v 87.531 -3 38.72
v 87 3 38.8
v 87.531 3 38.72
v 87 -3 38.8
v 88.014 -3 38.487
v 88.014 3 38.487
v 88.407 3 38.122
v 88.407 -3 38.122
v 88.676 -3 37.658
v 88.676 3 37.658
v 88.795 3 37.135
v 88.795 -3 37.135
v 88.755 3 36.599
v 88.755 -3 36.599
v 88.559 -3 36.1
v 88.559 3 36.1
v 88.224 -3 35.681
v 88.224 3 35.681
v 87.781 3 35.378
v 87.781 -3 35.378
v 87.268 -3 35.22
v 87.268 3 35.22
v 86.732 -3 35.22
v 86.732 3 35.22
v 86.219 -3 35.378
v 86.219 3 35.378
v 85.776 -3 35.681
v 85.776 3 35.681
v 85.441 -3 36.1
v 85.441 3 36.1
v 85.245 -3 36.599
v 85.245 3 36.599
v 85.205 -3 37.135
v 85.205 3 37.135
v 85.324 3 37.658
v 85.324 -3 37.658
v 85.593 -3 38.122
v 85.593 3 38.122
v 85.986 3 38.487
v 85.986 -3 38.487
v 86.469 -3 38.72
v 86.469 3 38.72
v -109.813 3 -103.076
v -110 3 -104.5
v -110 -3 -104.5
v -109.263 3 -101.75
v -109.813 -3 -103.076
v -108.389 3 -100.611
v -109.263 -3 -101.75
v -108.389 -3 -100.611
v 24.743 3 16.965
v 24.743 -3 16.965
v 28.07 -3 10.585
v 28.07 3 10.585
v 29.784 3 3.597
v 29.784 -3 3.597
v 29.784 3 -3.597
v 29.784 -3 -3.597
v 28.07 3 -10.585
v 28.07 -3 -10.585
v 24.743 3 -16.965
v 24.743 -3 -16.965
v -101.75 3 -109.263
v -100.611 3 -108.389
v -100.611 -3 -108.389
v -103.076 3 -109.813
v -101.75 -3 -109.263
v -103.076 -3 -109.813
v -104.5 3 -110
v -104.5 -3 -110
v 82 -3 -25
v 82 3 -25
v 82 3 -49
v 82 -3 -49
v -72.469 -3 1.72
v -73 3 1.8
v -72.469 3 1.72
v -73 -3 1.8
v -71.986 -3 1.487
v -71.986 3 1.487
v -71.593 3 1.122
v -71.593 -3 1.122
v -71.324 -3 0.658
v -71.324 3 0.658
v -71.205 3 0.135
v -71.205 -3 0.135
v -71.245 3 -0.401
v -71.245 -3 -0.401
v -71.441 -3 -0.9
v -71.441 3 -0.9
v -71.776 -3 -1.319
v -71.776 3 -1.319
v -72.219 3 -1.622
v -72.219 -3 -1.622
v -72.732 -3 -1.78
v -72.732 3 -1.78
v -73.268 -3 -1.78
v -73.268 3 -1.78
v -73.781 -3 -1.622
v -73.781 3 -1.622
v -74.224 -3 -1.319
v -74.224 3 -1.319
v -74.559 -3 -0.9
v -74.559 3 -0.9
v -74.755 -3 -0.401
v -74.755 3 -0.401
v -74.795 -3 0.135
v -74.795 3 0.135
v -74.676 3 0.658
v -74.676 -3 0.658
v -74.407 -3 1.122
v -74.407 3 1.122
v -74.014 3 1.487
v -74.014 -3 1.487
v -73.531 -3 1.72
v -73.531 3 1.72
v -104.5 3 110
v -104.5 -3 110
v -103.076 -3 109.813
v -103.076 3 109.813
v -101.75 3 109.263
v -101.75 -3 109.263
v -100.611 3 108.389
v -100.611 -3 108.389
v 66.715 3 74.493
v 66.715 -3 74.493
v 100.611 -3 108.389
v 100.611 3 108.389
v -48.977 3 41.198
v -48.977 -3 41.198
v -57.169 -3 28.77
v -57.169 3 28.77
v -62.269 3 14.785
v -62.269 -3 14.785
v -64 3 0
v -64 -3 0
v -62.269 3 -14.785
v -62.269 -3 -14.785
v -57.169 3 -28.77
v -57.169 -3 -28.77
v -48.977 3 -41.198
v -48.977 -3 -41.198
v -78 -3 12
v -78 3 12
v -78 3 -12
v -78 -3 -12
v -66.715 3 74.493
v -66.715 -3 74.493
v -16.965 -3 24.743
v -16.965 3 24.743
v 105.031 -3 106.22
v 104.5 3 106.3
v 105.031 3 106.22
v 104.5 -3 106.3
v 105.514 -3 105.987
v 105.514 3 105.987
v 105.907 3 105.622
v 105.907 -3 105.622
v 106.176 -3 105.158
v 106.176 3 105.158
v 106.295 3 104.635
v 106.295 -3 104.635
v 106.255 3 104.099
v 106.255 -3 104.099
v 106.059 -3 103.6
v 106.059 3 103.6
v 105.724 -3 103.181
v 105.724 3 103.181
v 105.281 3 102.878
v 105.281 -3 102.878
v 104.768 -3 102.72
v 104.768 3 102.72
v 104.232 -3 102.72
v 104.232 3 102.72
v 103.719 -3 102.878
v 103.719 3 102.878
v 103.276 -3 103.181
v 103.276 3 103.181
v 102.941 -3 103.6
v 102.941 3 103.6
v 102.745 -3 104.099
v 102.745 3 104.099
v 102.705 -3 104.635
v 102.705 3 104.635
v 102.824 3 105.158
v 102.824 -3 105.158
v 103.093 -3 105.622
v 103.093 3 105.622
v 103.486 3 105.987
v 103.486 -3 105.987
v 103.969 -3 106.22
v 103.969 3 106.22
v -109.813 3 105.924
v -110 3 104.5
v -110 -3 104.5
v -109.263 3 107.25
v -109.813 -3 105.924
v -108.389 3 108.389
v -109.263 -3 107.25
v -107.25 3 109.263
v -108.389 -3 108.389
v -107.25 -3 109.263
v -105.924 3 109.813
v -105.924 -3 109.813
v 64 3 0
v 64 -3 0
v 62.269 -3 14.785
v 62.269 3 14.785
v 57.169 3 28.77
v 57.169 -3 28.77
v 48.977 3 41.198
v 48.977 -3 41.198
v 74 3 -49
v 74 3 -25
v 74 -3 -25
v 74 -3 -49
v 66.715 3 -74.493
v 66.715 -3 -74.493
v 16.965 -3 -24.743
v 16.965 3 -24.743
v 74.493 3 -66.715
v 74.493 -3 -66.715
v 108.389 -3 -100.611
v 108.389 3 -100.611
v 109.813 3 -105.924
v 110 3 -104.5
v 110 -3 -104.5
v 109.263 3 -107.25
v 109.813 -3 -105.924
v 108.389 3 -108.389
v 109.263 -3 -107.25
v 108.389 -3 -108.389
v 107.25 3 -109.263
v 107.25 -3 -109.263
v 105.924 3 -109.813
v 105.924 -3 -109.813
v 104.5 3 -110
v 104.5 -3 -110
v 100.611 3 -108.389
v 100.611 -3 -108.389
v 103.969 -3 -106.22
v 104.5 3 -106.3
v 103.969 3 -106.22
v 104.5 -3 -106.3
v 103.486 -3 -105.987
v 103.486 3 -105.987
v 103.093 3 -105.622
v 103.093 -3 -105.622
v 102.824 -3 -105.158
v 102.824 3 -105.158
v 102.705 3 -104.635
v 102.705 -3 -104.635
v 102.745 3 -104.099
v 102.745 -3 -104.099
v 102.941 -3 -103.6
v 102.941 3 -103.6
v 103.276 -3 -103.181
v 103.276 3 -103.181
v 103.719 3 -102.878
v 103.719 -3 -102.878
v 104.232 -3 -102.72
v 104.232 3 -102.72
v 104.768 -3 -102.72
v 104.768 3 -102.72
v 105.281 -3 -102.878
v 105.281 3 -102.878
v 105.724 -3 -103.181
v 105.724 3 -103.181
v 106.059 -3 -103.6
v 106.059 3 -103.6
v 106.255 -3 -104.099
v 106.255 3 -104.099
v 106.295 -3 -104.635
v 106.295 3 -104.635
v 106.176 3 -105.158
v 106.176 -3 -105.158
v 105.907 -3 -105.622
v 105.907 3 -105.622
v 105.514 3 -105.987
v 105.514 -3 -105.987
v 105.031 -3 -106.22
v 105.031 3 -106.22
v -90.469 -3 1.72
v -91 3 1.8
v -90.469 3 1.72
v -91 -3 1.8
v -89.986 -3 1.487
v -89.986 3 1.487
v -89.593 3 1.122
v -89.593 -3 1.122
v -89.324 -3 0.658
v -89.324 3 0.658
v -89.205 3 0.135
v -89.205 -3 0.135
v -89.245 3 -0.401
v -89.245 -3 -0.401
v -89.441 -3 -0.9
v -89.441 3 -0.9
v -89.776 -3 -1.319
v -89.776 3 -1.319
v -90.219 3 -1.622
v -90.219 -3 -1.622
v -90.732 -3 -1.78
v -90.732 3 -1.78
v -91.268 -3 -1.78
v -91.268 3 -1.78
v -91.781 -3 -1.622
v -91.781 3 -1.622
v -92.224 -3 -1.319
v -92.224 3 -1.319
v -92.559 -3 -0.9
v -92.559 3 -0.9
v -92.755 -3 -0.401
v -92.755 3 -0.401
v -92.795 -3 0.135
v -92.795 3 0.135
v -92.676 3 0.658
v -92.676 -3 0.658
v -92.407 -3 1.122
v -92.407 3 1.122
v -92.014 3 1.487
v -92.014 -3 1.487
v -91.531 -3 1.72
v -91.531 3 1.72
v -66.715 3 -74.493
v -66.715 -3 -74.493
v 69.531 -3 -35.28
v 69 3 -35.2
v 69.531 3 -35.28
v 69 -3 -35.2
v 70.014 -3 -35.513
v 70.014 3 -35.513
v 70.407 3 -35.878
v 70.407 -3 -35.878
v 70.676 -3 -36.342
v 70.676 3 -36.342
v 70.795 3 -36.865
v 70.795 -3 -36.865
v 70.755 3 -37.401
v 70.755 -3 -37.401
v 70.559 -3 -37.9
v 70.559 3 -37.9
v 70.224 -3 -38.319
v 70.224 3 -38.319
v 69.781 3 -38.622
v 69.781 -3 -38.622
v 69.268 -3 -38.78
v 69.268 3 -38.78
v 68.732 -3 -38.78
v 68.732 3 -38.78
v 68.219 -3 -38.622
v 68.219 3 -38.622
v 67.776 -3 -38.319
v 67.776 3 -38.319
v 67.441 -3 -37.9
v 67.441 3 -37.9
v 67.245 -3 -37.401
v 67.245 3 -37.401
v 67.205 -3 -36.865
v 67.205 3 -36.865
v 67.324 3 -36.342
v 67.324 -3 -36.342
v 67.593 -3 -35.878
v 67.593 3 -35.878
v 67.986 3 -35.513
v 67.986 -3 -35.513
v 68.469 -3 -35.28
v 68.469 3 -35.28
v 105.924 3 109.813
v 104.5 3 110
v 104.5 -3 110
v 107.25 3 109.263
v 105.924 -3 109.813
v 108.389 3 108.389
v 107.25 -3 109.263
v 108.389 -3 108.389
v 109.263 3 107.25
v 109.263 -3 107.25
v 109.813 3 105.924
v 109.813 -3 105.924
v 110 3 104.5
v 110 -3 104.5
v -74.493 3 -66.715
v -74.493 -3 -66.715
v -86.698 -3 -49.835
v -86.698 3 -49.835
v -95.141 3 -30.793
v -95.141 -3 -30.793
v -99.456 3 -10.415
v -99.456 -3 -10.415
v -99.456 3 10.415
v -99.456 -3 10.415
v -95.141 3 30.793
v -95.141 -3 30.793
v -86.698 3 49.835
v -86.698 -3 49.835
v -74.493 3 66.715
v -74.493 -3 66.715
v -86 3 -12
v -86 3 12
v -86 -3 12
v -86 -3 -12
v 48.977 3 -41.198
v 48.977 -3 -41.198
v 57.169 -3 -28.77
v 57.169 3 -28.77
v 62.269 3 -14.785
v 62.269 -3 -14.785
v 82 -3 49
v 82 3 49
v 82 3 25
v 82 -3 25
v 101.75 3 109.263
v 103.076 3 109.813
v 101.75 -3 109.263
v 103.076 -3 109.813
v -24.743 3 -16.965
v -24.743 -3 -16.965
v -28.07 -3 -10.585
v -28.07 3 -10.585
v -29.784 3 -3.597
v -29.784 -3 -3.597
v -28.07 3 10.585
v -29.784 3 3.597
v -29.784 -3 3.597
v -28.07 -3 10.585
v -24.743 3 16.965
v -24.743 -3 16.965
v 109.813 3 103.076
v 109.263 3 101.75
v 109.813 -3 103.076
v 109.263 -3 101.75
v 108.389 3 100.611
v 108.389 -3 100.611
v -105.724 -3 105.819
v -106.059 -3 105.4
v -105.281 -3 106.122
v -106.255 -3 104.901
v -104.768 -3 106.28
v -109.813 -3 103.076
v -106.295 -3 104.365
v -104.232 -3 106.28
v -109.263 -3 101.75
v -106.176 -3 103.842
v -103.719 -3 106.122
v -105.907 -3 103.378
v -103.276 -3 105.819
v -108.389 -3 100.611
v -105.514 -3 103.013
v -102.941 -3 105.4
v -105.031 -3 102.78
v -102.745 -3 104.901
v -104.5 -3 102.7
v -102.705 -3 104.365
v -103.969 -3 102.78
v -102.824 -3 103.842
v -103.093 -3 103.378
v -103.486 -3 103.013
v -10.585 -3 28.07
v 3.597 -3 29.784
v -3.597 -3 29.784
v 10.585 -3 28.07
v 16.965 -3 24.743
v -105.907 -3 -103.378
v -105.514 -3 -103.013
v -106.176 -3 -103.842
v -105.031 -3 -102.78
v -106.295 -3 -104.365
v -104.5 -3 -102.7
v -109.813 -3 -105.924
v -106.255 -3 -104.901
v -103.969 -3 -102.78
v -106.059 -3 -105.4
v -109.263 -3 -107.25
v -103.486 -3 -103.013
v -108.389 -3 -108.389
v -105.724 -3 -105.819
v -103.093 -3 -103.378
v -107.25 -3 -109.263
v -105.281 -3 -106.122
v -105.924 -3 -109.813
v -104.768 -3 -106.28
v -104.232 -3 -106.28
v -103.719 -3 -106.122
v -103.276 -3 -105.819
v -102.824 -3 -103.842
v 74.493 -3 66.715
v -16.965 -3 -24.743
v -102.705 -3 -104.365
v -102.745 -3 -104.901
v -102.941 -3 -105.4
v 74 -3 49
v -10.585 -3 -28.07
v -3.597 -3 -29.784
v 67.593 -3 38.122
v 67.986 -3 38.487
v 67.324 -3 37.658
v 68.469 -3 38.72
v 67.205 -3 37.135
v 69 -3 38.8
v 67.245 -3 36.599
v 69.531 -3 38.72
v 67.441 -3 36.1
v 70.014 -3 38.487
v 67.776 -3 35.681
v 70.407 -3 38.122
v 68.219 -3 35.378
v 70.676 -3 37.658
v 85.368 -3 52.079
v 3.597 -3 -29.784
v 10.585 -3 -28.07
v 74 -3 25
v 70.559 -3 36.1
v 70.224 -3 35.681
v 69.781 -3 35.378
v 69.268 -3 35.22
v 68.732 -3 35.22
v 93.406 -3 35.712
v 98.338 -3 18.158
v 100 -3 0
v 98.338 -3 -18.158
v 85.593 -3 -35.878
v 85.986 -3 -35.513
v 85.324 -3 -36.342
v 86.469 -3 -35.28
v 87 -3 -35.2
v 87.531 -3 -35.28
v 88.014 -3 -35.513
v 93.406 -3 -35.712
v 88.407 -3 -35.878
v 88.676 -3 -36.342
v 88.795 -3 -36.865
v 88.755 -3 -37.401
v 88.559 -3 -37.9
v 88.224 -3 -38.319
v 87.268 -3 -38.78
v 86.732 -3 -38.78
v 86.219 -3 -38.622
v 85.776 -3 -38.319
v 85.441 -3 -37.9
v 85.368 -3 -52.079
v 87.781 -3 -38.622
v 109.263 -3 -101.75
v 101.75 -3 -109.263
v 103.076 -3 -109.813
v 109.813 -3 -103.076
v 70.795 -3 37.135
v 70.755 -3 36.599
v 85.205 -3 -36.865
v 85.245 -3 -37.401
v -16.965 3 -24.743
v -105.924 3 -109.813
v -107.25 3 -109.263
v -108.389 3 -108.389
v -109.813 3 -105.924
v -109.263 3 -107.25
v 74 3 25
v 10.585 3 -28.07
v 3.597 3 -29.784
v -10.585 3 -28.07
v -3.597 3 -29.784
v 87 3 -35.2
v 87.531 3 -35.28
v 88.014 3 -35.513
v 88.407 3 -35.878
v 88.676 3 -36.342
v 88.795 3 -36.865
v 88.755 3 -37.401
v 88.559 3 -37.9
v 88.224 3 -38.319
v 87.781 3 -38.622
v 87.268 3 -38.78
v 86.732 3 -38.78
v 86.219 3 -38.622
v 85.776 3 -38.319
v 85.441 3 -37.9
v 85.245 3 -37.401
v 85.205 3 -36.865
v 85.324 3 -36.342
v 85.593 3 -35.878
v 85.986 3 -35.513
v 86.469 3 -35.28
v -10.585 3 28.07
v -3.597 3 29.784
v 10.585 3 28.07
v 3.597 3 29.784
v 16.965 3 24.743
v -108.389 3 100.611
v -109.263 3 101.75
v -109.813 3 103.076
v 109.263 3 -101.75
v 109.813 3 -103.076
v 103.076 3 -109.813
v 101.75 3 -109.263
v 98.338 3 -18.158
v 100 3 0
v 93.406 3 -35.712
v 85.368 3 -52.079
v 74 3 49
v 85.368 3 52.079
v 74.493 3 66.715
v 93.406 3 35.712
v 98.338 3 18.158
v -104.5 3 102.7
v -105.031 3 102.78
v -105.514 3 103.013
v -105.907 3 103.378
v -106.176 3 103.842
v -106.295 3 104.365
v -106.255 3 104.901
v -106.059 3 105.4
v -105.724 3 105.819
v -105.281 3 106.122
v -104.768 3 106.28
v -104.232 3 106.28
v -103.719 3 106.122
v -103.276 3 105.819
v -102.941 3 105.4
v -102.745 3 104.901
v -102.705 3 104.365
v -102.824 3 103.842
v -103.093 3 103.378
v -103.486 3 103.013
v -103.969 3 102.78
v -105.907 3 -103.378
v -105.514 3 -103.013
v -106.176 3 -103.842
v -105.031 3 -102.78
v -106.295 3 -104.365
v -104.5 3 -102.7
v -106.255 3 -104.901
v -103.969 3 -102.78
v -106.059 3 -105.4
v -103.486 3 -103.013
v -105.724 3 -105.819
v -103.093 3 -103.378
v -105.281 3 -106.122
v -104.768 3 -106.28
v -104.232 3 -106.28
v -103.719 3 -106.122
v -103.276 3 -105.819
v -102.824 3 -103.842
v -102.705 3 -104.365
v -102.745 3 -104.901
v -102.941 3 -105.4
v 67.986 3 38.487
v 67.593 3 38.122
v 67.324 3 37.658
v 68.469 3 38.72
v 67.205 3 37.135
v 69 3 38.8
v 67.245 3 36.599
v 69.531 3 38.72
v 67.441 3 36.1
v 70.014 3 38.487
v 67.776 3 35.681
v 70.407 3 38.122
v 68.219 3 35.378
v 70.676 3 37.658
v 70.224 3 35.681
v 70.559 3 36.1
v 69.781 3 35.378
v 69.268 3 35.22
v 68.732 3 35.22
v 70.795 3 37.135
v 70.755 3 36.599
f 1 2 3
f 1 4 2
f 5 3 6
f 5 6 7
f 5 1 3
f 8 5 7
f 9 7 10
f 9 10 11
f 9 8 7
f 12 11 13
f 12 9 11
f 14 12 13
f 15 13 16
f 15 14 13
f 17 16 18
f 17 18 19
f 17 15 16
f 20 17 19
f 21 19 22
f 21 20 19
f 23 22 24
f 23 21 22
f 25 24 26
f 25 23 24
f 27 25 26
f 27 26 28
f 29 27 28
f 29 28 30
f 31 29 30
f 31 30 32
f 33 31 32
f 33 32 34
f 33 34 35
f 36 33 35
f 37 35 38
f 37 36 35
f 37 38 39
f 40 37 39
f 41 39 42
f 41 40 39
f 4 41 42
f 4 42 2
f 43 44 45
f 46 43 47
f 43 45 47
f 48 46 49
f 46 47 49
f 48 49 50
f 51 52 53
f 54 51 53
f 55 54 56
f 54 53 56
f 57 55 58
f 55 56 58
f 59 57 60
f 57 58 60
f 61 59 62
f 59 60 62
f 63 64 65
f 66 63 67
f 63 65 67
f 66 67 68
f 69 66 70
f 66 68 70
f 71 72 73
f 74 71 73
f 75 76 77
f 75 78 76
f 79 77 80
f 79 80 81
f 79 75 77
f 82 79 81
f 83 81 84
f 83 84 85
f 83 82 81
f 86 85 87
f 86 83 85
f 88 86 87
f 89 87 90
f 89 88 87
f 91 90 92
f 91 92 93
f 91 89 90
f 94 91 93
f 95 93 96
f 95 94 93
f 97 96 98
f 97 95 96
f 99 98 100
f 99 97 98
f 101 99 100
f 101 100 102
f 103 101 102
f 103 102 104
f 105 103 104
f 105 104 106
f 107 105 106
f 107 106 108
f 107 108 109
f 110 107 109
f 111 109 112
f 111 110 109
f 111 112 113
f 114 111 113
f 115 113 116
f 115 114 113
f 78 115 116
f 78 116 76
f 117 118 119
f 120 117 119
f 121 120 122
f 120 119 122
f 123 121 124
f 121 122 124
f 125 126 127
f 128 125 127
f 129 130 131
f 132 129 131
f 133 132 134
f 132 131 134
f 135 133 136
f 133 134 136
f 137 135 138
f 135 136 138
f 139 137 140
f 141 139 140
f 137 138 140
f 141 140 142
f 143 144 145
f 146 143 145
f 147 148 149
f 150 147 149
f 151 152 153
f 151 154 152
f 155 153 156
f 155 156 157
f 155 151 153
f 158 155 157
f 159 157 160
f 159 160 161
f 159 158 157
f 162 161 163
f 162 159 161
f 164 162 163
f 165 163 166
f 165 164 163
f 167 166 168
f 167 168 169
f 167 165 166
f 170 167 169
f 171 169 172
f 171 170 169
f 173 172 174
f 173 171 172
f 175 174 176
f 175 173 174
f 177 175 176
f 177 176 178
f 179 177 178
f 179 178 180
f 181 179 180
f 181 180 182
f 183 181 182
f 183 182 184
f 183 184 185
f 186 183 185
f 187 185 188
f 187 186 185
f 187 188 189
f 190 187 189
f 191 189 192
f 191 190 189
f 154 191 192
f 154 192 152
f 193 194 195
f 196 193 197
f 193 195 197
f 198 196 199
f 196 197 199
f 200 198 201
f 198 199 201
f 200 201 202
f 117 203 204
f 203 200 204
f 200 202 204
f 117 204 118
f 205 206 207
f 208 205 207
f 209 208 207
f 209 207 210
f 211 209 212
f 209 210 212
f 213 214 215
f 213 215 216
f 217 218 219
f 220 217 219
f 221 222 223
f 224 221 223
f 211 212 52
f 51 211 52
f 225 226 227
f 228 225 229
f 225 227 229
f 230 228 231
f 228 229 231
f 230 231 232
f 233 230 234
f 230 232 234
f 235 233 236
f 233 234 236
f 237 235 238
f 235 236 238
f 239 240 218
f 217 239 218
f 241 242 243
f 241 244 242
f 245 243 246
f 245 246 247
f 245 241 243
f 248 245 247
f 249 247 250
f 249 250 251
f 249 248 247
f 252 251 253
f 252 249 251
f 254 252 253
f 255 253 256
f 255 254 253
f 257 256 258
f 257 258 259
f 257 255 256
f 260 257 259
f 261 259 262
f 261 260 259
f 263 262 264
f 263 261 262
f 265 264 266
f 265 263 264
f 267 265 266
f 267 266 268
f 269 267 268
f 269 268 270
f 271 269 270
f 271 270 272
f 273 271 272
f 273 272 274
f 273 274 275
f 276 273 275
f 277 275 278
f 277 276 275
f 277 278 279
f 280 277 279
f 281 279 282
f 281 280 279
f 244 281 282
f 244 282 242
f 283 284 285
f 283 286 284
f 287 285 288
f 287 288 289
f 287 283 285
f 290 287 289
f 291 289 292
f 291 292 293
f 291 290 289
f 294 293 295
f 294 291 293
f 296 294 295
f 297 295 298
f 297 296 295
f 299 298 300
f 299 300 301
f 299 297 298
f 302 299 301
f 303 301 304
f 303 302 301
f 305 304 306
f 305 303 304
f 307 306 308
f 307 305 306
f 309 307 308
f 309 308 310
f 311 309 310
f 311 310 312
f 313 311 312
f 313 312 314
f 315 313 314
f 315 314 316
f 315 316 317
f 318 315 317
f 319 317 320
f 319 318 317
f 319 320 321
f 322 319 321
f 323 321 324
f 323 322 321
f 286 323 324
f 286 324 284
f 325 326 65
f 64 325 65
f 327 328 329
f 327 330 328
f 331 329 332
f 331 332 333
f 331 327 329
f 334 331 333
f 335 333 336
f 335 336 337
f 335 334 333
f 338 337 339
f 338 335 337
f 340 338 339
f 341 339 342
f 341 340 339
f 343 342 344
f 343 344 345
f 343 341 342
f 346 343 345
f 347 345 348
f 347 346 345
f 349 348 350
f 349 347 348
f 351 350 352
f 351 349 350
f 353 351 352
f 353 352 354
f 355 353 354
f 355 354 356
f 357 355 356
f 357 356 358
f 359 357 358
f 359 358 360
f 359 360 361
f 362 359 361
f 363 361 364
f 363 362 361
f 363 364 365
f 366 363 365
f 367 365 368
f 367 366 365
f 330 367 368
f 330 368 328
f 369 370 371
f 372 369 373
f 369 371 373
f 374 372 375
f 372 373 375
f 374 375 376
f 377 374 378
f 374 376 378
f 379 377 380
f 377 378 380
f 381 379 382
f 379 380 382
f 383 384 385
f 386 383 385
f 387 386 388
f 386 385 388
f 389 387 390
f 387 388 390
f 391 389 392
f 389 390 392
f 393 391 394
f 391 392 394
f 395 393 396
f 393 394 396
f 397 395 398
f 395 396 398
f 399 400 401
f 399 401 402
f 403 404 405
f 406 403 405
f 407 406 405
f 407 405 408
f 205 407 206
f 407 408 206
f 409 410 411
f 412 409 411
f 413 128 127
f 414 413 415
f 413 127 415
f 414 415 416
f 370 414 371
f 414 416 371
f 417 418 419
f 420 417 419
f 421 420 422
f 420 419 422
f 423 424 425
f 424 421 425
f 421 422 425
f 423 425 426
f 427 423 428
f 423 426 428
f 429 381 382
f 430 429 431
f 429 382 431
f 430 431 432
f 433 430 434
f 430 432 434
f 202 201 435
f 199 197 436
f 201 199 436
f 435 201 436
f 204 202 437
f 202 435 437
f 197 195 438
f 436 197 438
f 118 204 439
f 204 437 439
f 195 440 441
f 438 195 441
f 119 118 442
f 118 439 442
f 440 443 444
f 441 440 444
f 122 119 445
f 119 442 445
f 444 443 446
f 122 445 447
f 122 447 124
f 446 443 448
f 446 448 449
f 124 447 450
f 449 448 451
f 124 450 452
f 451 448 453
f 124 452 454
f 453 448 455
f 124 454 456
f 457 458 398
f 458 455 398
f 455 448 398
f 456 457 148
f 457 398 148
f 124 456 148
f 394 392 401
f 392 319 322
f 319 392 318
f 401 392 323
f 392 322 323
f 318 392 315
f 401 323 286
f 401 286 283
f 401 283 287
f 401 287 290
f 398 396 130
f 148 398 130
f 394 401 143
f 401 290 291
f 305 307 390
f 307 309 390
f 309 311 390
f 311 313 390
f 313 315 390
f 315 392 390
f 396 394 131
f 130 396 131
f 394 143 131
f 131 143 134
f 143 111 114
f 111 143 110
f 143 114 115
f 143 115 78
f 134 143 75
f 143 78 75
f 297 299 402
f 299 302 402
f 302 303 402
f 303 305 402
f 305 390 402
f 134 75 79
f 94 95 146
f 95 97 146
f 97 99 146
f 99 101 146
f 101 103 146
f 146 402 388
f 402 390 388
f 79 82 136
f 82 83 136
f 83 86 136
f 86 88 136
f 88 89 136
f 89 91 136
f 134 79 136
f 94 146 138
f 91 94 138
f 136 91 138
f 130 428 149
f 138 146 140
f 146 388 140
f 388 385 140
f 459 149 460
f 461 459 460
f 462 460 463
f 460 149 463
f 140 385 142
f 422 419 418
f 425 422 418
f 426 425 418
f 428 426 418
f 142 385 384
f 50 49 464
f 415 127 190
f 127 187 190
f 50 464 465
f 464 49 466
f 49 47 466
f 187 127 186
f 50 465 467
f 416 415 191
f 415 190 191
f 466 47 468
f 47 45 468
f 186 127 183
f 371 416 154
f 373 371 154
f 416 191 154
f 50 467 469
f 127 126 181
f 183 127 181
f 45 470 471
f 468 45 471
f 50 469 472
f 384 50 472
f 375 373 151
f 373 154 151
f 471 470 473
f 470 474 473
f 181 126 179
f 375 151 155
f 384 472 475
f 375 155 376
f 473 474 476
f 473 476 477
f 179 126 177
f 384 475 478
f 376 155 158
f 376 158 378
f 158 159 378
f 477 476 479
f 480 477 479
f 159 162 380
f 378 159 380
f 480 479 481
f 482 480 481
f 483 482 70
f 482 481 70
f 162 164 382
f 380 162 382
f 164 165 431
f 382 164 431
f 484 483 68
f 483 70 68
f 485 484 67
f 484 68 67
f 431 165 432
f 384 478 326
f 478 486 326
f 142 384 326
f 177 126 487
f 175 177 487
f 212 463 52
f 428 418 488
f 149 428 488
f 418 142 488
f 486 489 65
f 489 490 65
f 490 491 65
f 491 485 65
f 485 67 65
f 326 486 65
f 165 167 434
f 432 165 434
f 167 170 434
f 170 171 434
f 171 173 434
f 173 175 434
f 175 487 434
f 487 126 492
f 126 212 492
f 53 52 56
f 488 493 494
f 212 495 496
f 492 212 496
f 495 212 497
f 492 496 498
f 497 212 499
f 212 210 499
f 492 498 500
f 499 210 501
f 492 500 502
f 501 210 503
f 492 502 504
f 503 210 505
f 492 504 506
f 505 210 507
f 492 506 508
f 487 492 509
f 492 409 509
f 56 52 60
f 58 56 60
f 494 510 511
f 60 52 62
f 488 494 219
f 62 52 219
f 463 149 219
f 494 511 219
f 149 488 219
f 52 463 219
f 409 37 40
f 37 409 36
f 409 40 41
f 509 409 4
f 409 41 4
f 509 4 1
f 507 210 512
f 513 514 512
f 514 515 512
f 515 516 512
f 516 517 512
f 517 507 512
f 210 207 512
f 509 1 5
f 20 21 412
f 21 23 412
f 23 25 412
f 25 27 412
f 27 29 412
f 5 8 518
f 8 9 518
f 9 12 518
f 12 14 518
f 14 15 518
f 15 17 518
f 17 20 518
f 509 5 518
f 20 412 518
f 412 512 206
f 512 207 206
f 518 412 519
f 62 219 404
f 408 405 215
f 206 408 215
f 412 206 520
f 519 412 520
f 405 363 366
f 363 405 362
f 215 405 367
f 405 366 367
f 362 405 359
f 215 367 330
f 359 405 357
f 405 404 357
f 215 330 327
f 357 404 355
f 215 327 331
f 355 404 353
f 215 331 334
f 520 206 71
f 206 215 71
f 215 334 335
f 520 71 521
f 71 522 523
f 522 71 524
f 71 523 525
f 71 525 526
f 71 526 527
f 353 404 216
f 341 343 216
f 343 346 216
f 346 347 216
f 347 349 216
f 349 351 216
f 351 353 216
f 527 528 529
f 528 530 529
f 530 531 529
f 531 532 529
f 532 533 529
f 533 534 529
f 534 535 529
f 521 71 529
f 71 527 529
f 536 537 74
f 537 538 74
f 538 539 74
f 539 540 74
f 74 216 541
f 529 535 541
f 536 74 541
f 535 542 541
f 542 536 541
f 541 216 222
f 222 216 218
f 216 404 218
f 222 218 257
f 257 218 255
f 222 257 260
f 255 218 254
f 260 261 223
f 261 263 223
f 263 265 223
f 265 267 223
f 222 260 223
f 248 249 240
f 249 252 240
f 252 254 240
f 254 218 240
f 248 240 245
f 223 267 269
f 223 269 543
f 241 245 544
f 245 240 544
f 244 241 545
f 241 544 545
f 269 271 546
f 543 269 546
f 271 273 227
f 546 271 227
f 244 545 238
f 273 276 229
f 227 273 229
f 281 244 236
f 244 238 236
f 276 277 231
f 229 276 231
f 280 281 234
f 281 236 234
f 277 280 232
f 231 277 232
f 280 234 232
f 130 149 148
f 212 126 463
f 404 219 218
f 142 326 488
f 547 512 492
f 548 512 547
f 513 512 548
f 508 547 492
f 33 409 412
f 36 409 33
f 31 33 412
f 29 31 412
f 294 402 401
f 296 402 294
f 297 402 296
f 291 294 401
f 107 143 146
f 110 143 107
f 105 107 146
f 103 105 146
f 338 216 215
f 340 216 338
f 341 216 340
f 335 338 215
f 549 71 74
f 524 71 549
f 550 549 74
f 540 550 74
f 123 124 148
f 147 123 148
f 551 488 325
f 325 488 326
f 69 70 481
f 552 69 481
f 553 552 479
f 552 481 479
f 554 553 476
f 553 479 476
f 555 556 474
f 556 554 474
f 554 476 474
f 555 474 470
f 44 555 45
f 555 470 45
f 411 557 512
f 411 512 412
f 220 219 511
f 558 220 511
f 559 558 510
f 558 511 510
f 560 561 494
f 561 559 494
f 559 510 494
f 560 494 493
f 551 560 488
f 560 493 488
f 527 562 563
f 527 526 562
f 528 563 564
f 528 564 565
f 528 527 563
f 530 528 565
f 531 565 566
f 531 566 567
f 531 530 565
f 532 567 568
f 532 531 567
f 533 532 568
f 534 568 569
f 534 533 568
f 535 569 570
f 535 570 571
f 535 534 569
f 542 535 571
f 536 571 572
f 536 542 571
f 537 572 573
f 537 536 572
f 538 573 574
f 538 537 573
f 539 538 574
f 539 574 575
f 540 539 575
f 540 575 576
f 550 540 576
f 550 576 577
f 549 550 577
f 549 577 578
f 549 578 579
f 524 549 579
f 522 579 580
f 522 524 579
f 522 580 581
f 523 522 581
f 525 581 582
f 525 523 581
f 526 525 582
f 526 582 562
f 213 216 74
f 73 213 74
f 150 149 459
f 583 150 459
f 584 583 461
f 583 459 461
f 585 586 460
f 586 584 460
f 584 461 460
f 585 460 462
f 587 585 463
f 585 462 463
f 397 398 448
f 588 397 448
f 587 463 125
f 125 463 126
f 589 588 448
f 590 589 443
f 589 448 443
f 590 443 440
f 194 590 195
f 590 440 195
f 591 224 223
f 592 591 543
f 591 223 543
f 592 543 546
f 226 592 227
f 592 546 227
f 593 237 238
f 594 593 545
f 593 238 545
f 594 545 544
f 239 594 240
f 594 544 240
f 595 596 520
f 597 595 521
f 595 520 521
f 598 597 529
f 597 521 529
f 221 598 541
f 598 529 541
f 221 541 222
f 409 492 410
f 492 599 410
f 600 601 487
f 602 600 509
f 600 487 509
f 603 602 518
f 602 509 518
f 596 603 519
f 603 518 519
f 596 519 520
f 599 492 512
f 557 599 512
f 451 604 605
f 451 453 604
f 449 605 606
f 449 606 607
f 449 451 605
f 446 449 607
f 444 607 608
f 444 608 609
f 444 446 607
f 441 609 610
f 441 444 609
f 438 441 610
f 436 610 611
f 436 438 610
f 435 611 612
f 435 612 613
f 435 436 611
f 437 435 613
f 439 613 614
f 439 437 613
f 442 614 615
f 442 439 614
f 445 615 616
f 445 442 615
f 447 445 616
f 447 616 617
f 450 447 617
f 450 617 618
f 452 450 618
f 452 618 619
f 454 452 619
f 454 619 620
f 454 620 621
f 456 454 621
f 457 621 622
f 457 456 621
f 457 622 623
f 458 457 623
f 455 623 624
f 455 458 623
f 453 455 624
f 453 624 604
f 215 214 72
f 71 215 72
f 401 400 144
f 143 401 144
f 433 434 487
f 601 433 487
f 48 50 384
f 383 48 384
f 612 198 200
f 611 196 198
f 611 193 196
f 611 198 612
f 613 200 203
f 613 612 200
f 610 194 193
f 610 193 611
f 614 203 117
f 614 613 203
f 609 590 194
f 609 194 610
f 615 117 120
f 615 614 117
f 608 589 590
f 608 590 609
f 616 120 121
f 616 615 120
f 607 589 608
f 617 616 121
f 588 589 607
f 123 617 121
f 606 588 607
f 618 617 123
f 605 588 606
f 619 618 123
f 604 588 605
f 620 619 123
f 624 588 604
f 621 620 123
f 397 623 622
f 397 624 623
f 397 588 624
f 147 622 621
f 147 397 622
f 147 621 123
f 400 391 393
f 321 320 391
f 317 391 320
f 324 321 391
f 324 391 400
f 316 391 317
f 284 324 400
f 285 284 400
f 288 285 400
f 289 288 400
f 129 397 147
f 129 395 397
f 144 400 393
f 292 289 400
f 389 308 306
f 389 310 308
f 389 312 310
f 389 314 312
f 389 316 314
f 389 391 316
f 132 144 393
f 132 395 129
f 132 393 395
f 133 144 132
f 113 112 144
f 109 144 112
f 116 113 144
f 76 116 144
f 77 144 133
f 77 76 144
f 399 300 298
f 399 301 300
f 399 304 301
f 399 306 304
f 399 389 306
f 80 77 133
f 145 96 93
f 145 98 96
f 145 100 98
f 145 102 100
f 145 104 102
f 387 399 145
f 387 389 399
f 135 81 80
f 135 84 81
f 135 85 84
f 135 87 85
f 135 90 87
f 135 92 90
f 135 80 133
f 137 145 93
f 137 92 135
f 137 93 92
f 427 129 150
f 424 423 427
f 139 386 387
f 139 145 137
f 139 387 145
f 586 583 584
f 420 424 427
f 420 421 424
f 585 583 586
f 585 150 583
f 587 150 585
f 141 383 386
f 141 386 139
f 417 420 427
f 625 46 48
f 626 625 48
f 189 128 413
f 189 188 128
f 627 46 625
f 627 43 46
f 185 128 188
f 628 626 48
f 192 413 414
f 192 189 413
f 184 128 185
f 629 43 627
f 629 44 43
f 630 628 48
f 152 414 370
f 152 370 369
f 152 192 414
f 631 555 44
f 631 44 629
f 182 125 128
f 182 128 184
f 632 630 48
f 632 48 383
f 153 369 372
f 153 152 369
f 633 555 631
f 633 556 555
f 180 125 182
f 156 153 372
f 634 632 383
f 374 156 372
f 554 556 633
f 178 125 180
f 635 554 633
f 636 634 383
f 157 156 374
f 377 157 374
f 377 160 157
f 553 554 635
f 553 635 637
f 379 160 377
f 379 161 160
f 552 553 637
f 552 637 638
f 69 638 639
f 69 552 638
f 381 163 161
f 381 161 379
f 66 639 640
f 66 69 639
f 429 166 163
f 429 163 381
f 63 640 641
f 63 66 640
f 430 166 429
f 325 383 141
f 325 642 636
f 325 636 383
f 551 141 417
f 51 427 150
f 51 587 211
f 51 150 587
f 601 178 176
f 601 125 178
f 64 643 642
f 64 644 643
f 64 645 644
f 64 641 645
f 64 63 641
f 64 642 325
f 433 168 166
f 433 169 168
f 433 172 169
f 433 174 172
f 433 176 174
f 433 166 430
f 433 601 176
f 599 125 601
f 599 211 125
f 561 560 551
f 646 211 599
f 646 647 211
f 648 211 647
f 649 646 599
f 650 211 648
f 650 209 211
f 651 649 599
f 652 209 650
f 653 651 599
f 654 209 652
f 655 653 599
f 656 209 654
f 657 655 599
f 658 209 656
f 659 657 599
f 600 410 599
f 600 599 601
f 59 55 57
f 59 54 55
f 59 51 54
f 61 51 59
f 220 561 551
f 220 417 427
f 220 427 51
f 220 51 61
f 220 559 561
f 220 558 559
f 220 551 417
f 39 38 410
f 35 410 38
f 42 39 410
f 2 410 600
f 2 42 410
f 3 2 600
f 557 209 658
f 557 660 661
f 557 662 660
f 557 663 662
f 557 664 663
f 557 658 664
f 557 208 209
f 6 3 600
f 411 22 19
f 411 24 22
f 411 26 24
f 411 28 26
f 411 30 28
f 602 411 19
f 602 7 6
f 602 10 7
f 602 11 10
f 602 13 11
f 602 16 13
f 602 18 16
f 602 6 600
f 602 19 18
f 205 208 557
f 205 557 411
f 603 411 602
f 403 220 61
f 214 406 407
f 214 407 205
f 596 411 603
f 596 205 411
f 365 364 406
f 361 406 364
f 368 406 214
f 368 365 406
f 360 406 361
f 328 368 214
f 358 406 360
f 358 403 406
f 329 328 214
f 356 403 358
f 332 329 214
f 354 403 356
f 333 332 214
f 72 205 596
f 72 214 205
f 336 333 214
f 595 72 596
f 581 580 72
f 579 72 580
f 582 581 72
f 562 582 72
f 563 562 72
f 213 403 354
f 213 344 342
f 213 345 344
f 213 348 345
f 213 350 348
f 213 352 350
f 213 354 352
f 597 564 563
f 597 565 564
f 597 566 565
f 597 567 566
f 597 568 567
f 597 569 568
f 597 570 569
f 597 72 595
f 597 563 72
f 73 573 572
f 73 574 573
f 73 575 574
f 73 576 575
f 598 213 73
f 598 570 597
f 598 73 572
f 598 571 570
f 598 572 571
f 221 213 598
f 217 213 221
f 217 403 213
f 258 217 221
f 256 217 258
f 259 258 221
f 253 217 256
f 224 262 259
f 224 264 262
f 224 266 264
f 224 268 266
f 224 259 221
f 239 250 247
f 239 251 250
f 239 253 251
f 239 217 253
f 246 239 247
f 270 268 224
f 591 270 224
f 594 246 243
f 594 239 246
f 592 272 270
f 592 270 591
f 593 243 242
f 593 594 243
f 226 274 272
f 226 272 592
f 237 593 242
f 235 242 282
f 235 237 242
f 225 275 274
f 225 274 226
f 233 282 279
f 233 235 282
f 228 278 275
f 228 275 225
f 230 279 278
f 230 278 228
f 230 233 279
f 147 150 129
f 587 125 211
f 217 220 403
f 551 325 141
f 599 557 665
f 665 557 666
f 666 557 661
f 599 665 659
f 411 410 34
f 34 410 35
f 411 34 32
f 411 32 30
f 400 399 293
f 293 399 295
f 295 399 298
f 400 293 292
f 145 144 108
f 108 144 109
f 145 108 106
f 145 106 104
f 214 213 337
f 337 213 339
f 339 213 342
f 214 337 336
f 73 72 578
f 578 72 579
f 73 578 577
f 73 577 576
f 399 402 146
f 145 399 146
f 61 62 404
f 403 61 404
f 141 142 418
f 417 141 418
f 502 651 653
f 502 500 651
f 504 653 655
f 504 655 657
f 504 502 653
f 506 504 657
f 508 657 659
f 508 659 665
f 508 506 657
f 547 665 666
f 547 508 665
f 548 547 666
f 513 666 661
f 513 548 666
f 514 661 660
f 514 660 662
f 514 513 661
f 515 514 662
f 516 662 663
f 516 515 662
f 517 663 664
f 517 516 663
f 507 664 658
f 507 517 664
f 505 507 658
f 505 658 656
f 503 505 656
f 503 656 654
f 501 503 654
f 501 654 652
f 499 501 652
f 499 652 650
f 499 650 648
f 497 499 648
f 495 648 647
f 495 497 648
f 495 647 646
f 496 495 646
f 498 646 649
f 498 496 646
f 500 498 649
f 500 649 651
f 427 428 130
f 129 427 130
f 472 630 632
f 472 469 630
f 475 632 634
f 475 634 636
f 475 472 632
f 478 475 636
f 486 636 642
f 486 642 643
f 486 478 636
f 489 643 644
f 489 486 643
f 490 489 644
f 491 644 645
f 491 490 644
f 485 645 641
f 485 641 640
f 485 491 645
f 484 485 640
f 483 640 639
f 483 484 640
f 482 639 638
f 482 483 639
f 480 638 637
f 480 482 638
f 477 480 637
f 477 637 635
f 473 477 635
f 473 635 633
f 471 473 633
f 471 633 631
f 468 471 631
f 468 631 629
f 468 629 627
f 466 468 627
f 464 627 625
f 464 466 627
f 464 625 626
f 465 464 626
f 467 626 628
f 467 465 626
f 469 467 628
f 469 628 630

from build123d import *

# Parameters (mm, degrees)
SKETCH1_W           = 220
SKETCH1_H           = 220
SKETCH1_R           = 1.8
SKETCH1_W_2         = 8
SKETCH1_H_2         = 24
BOSS_EXTRUDE1_DEPTH = 3
CUT_EXTRUDE1_DEPTH  = 10


with BuildPart() as part:
    # Sketch1 → Boss-Extrude1 (new, symmetric)
    with BuildSketch(Plane(origin=(0, 0, 0), x_dir=(1, 0, 0), z_dir=(0, 1, 0))):
        Rectangle(SKETCH1_W, SKETCH1_H)
        with Locations(Location((-104.5, 104.5, 0), (0, 0, 270))):
            Circle(SKETCH1_R, mode=Mode.SUBTRACT)
        with Locations(Location((104.5, 104.5, 0), (0, 0, 90))):
            Circle(SKETCH1_R, mode=Mode.SUBTRACT)
        with Locations(Location((104.5, -104.5, 0), (0, 0, 270))):
            Circle(SKETCH1_R, mode=Mode.SUBTRACT)
        with Locations(Location((-104.5, -104.5, 0), (0, 0, 90))):
            Circle(SKETCH1_R, mode=Mode.SUBTRACT)
        with Locations(Location((-73, 0, 0), (0, 0, 270))):
            Circle(SKETCH1_R, mode=Mode.SUBTRACT)
        with Locations(Location((-91, 0, 0), (0, 0, 270))):
            Circle(SKETCH1_R, mode=Mode.SUBTRACT)
        with Locations(Location((87, 37, 0), (0, 0, 270))):
            Circle(SKETCH1_R, mode=Mode.SUBTRACT)
        with Locations(Location((69, 37, 0), (0, 0, 270))):
            Circle(SKETCH1_R, mode=Mode.SUBTRACT)
        with Locations(Location((87, -37, 0), (0, 0, 270))):
            Circle(SKETCH1_R, mode=Mode.SUBTRACT)
        with Locations(Location((69, -37, 0), (0, 0, 270))):
            Circle(SKETCH1_R, mode=Mode.SUBTRACT)
        with Locations((-82, 0)):
            Rectangle(SKETCH1_W_2, SKETCH1_H_2, mode=Mode.SUBTRACT)
        with Locations((78, 37)):
            Rectangle(SKETCH1_W_2, SKETCH1_H_2, mode=Mode.SUBTRACT)
        with Locations((78, -37)):
            Rectangle(SKETCH1_W_2, SKETCH1_H_2, mode=Mode.SUBTRACT)
    extrude(amount=BOSS_EXTRUDE1_DEPTH, both=True)

    # Sketch2 → Cut-Extrude1 (cut)
    with BuildSketch(Plane.XZ.offset(3)):
        with BuildLine():
            ThreePointArc((-108.389087297, 100.610912703), (-109.581337429, 102.395241122), (-110, 104.5))
            Line((-110, 104.5), (-110, -104.50000001))
            ThreePointArc((-110, -104.50000001), (-109.581337431, -102.395241127), (-108.389087297, -100.610912703))
            Line((-108.389087297, -100.610912703), (-74.492734511, -66.714559918))
            ThreePointArc((-74.492734511, -66.714559918), (-100, 0), (-74.492734511, 66.714559918))
            Line((-74.492734511, 66.714559918), (-108.389087297, 100.610912703))
        make_face()
        with BuildLine():
            Line((-24.74274405, 16.964569457), (-48.976502392, 41.198327799))
            ThreePointArc((-48.976502392, 41.198327799), (-64, 0), (-48.976502392, -41.198327799))
            Line((-48.976502392, -41.198327799), (-24.74274405, -16.964569457))
            ThreePointArc((-24.74274405, -16.964569457), (-30, 0), (-24.74274405, 16.964569457))
        make_face()
        with BuildLine():
            ThreePointArc((64, 0), (60.126933038, 21.926055812), (48.976502392, 41.198327799))
            Line((48.976502392, 41.198327799), (24.74274405, 16.964569457))
            ThreePointArc((24.74274405, 16.964569457), (28.65556073, 8.880249954), (30, 0))
            ThreePointArc((30, 0), (28.65556073, -8.880249954), (24.74274405, -16.964569457))
            Line((24.74274405, -16.964569457), (48.976502392, -41.198327799))
            ThreePointArc((48.976502392, -41.198327799), (60.126933038, -21.926055812), (64, 0))
        make_face()
        with BuildLine():
            Line((110, -104.5), (110, 104.5))
            ThreePointArc((110, 104.5), (109.581337429, 102.395241122), (108.389087297, 100.610912703))
            Line((108.389087297, 100.610912703), (74.492734511, 66.714559918))
            ThreePointArc((74.492734511, 66.714559918), (93.405763878, 35.71222864), (100, 0))
            ThreePointArc((100, 0), (93.405763878, -35.71222864), (74.492734511, -66.714559918))
            Line((74.492734511, -66.714559918), (108.389087297, -100.610912703))
            ThreePointArc((108.389087297, -100.610912703), (109.581337429, -102.395241122), (110, -104.5))
        make_face()
        with BuildLine():
            Line((-104.500000026, 110), (-110, 110))
            Line((-110, 110), (-110, 104.5))
            ThreePointArc((-110, 104.5), (-108.389087306, 108.389087287), (-104.500000026, 110))
        make_face()
        with BuildLine():
            ThreePointArc((-104.5, -110), (-108.389087293, -108.3890873), (-110, -104.50000001))
            Line((-110, -104.50000001), (-110, -110))
            Line((-110, -110), (-104.5, -110))
        make_face()
        with BuildLine():
            Line((110, -110), (110, -104.5))
            ThreePointArc((110, -104.5), (108.389087297, -108.389087297), (104.5, -110))
            Line((104.5, -110), (110, -110))
        make_face()
        with BuildLine():
            Line((110, 110), (104.5, 110))
            ThreePointArc((104.5, 110), (108.389087297, 108.389087297), (110, 104.5))
            Line((110, 104.5), (110, 110))
        make_face()
        with BuildLine():
            ThreePointArc((41.198327799, 48.976502392), (0, 64), (-41.198327799, 48.976502392))
            Line((-41.198327799, 48.976502392), (-16.964569457, 24.74274405))
            ThreePointArc((-16.964569457, 24.74274405), (0, 30), (16.964569457, 24.74274405))
            Line((16.964569457, 24.74274405), (41.198327799, 48.976502392))
        make_face()
        with BuildLine():
            ThreePointArc((66.714559918, 74.492734511), (0, 100), (-66.714559918, 74.492734511))
            Line((-66.714559918, 74.492734511), (-41.198327799, 48.976502392))
            ThreePointArc((-41.198327799, 48.976502392), (0, 64), (41.198327799, 48.976502392))
            Line((41.198327799, 48.976502392), (66.714559918, 74.492734511))
        make_face()
        with BuildLine():
            Line((104.5, 110), (-104.500000026, 110))
            ThreePointArc((-104.500000026, 110), (-102.395241134, 109.581337434), (-100.610912703, 108.389087297))
            Line((-100.610912703, 108.389087297), (-66.714559918, 74.492734511))
            ThreePointArc((-66.714559918, 74.492734511), (0, 100), (66.714559918, 74.492734511))
            Line((66.714559918, 74.492734511), (100.610912703, 108.389087297))
            ThreePointArc((100.610912703, 108.389087297), (102.395241122, 109.581337429), (104.5, 110))
        make_face()
        with BuildLine():
            ThreePointArc((-100.610912703, -108.389087297), (-102.395241122, -109.581337429), (-104.5, -110))
            Line((-104.5, -110), (104.5, -110))
            ThreePointArc((104.5, -110), (102.395241122, -109.581337429), (100.610912703, -108.389087297))
            Line((100.610912703, -108.389087297), (66.714559918, -74.492734511))
            ThreePointArc((66.714559918, -74.492734511), (0, -100), (-66.714559918, -74.492734511))
            Line((-66.714559918, -74.492734511), (-100.610912703, -108.389087297))
        make_face()
        with BuildLine():
            Line((-41.198327799, -48.976502392), (-66.714559918, -74.492734511))
            ThreePointArc((-66.714559918, -74.492734511), (0, -100), (66.714559918, -74.492734511))
            Line((66.714559918, -74.492734511), (41.198327799, -48.976502392))
            ThreePointArc((41.198327799, -48.976502392), (0, -64), (-41.198327799, -48.976502392))
        make_face()
        with BuildLine():
            Line((-16.964569457, -24.74274405), (-41.198327799, -48.976502392))
            ThreePointArc((-41.198327799, -48.976502392), (0, -64), (41.198327799, -48.976502392))
            Line((41.198327799, -48.976502392), (16.964569457, -24.74274405))
            ThreePointArc((16.964569457, -24.74274405), (0, -30), (-16.964569457, -24.74274405))
        make_face()
    extrude(amount=-CUT_EXTRUDE1_DEPTH, mode=Mode.SUBTRACT)


solid = part.part
